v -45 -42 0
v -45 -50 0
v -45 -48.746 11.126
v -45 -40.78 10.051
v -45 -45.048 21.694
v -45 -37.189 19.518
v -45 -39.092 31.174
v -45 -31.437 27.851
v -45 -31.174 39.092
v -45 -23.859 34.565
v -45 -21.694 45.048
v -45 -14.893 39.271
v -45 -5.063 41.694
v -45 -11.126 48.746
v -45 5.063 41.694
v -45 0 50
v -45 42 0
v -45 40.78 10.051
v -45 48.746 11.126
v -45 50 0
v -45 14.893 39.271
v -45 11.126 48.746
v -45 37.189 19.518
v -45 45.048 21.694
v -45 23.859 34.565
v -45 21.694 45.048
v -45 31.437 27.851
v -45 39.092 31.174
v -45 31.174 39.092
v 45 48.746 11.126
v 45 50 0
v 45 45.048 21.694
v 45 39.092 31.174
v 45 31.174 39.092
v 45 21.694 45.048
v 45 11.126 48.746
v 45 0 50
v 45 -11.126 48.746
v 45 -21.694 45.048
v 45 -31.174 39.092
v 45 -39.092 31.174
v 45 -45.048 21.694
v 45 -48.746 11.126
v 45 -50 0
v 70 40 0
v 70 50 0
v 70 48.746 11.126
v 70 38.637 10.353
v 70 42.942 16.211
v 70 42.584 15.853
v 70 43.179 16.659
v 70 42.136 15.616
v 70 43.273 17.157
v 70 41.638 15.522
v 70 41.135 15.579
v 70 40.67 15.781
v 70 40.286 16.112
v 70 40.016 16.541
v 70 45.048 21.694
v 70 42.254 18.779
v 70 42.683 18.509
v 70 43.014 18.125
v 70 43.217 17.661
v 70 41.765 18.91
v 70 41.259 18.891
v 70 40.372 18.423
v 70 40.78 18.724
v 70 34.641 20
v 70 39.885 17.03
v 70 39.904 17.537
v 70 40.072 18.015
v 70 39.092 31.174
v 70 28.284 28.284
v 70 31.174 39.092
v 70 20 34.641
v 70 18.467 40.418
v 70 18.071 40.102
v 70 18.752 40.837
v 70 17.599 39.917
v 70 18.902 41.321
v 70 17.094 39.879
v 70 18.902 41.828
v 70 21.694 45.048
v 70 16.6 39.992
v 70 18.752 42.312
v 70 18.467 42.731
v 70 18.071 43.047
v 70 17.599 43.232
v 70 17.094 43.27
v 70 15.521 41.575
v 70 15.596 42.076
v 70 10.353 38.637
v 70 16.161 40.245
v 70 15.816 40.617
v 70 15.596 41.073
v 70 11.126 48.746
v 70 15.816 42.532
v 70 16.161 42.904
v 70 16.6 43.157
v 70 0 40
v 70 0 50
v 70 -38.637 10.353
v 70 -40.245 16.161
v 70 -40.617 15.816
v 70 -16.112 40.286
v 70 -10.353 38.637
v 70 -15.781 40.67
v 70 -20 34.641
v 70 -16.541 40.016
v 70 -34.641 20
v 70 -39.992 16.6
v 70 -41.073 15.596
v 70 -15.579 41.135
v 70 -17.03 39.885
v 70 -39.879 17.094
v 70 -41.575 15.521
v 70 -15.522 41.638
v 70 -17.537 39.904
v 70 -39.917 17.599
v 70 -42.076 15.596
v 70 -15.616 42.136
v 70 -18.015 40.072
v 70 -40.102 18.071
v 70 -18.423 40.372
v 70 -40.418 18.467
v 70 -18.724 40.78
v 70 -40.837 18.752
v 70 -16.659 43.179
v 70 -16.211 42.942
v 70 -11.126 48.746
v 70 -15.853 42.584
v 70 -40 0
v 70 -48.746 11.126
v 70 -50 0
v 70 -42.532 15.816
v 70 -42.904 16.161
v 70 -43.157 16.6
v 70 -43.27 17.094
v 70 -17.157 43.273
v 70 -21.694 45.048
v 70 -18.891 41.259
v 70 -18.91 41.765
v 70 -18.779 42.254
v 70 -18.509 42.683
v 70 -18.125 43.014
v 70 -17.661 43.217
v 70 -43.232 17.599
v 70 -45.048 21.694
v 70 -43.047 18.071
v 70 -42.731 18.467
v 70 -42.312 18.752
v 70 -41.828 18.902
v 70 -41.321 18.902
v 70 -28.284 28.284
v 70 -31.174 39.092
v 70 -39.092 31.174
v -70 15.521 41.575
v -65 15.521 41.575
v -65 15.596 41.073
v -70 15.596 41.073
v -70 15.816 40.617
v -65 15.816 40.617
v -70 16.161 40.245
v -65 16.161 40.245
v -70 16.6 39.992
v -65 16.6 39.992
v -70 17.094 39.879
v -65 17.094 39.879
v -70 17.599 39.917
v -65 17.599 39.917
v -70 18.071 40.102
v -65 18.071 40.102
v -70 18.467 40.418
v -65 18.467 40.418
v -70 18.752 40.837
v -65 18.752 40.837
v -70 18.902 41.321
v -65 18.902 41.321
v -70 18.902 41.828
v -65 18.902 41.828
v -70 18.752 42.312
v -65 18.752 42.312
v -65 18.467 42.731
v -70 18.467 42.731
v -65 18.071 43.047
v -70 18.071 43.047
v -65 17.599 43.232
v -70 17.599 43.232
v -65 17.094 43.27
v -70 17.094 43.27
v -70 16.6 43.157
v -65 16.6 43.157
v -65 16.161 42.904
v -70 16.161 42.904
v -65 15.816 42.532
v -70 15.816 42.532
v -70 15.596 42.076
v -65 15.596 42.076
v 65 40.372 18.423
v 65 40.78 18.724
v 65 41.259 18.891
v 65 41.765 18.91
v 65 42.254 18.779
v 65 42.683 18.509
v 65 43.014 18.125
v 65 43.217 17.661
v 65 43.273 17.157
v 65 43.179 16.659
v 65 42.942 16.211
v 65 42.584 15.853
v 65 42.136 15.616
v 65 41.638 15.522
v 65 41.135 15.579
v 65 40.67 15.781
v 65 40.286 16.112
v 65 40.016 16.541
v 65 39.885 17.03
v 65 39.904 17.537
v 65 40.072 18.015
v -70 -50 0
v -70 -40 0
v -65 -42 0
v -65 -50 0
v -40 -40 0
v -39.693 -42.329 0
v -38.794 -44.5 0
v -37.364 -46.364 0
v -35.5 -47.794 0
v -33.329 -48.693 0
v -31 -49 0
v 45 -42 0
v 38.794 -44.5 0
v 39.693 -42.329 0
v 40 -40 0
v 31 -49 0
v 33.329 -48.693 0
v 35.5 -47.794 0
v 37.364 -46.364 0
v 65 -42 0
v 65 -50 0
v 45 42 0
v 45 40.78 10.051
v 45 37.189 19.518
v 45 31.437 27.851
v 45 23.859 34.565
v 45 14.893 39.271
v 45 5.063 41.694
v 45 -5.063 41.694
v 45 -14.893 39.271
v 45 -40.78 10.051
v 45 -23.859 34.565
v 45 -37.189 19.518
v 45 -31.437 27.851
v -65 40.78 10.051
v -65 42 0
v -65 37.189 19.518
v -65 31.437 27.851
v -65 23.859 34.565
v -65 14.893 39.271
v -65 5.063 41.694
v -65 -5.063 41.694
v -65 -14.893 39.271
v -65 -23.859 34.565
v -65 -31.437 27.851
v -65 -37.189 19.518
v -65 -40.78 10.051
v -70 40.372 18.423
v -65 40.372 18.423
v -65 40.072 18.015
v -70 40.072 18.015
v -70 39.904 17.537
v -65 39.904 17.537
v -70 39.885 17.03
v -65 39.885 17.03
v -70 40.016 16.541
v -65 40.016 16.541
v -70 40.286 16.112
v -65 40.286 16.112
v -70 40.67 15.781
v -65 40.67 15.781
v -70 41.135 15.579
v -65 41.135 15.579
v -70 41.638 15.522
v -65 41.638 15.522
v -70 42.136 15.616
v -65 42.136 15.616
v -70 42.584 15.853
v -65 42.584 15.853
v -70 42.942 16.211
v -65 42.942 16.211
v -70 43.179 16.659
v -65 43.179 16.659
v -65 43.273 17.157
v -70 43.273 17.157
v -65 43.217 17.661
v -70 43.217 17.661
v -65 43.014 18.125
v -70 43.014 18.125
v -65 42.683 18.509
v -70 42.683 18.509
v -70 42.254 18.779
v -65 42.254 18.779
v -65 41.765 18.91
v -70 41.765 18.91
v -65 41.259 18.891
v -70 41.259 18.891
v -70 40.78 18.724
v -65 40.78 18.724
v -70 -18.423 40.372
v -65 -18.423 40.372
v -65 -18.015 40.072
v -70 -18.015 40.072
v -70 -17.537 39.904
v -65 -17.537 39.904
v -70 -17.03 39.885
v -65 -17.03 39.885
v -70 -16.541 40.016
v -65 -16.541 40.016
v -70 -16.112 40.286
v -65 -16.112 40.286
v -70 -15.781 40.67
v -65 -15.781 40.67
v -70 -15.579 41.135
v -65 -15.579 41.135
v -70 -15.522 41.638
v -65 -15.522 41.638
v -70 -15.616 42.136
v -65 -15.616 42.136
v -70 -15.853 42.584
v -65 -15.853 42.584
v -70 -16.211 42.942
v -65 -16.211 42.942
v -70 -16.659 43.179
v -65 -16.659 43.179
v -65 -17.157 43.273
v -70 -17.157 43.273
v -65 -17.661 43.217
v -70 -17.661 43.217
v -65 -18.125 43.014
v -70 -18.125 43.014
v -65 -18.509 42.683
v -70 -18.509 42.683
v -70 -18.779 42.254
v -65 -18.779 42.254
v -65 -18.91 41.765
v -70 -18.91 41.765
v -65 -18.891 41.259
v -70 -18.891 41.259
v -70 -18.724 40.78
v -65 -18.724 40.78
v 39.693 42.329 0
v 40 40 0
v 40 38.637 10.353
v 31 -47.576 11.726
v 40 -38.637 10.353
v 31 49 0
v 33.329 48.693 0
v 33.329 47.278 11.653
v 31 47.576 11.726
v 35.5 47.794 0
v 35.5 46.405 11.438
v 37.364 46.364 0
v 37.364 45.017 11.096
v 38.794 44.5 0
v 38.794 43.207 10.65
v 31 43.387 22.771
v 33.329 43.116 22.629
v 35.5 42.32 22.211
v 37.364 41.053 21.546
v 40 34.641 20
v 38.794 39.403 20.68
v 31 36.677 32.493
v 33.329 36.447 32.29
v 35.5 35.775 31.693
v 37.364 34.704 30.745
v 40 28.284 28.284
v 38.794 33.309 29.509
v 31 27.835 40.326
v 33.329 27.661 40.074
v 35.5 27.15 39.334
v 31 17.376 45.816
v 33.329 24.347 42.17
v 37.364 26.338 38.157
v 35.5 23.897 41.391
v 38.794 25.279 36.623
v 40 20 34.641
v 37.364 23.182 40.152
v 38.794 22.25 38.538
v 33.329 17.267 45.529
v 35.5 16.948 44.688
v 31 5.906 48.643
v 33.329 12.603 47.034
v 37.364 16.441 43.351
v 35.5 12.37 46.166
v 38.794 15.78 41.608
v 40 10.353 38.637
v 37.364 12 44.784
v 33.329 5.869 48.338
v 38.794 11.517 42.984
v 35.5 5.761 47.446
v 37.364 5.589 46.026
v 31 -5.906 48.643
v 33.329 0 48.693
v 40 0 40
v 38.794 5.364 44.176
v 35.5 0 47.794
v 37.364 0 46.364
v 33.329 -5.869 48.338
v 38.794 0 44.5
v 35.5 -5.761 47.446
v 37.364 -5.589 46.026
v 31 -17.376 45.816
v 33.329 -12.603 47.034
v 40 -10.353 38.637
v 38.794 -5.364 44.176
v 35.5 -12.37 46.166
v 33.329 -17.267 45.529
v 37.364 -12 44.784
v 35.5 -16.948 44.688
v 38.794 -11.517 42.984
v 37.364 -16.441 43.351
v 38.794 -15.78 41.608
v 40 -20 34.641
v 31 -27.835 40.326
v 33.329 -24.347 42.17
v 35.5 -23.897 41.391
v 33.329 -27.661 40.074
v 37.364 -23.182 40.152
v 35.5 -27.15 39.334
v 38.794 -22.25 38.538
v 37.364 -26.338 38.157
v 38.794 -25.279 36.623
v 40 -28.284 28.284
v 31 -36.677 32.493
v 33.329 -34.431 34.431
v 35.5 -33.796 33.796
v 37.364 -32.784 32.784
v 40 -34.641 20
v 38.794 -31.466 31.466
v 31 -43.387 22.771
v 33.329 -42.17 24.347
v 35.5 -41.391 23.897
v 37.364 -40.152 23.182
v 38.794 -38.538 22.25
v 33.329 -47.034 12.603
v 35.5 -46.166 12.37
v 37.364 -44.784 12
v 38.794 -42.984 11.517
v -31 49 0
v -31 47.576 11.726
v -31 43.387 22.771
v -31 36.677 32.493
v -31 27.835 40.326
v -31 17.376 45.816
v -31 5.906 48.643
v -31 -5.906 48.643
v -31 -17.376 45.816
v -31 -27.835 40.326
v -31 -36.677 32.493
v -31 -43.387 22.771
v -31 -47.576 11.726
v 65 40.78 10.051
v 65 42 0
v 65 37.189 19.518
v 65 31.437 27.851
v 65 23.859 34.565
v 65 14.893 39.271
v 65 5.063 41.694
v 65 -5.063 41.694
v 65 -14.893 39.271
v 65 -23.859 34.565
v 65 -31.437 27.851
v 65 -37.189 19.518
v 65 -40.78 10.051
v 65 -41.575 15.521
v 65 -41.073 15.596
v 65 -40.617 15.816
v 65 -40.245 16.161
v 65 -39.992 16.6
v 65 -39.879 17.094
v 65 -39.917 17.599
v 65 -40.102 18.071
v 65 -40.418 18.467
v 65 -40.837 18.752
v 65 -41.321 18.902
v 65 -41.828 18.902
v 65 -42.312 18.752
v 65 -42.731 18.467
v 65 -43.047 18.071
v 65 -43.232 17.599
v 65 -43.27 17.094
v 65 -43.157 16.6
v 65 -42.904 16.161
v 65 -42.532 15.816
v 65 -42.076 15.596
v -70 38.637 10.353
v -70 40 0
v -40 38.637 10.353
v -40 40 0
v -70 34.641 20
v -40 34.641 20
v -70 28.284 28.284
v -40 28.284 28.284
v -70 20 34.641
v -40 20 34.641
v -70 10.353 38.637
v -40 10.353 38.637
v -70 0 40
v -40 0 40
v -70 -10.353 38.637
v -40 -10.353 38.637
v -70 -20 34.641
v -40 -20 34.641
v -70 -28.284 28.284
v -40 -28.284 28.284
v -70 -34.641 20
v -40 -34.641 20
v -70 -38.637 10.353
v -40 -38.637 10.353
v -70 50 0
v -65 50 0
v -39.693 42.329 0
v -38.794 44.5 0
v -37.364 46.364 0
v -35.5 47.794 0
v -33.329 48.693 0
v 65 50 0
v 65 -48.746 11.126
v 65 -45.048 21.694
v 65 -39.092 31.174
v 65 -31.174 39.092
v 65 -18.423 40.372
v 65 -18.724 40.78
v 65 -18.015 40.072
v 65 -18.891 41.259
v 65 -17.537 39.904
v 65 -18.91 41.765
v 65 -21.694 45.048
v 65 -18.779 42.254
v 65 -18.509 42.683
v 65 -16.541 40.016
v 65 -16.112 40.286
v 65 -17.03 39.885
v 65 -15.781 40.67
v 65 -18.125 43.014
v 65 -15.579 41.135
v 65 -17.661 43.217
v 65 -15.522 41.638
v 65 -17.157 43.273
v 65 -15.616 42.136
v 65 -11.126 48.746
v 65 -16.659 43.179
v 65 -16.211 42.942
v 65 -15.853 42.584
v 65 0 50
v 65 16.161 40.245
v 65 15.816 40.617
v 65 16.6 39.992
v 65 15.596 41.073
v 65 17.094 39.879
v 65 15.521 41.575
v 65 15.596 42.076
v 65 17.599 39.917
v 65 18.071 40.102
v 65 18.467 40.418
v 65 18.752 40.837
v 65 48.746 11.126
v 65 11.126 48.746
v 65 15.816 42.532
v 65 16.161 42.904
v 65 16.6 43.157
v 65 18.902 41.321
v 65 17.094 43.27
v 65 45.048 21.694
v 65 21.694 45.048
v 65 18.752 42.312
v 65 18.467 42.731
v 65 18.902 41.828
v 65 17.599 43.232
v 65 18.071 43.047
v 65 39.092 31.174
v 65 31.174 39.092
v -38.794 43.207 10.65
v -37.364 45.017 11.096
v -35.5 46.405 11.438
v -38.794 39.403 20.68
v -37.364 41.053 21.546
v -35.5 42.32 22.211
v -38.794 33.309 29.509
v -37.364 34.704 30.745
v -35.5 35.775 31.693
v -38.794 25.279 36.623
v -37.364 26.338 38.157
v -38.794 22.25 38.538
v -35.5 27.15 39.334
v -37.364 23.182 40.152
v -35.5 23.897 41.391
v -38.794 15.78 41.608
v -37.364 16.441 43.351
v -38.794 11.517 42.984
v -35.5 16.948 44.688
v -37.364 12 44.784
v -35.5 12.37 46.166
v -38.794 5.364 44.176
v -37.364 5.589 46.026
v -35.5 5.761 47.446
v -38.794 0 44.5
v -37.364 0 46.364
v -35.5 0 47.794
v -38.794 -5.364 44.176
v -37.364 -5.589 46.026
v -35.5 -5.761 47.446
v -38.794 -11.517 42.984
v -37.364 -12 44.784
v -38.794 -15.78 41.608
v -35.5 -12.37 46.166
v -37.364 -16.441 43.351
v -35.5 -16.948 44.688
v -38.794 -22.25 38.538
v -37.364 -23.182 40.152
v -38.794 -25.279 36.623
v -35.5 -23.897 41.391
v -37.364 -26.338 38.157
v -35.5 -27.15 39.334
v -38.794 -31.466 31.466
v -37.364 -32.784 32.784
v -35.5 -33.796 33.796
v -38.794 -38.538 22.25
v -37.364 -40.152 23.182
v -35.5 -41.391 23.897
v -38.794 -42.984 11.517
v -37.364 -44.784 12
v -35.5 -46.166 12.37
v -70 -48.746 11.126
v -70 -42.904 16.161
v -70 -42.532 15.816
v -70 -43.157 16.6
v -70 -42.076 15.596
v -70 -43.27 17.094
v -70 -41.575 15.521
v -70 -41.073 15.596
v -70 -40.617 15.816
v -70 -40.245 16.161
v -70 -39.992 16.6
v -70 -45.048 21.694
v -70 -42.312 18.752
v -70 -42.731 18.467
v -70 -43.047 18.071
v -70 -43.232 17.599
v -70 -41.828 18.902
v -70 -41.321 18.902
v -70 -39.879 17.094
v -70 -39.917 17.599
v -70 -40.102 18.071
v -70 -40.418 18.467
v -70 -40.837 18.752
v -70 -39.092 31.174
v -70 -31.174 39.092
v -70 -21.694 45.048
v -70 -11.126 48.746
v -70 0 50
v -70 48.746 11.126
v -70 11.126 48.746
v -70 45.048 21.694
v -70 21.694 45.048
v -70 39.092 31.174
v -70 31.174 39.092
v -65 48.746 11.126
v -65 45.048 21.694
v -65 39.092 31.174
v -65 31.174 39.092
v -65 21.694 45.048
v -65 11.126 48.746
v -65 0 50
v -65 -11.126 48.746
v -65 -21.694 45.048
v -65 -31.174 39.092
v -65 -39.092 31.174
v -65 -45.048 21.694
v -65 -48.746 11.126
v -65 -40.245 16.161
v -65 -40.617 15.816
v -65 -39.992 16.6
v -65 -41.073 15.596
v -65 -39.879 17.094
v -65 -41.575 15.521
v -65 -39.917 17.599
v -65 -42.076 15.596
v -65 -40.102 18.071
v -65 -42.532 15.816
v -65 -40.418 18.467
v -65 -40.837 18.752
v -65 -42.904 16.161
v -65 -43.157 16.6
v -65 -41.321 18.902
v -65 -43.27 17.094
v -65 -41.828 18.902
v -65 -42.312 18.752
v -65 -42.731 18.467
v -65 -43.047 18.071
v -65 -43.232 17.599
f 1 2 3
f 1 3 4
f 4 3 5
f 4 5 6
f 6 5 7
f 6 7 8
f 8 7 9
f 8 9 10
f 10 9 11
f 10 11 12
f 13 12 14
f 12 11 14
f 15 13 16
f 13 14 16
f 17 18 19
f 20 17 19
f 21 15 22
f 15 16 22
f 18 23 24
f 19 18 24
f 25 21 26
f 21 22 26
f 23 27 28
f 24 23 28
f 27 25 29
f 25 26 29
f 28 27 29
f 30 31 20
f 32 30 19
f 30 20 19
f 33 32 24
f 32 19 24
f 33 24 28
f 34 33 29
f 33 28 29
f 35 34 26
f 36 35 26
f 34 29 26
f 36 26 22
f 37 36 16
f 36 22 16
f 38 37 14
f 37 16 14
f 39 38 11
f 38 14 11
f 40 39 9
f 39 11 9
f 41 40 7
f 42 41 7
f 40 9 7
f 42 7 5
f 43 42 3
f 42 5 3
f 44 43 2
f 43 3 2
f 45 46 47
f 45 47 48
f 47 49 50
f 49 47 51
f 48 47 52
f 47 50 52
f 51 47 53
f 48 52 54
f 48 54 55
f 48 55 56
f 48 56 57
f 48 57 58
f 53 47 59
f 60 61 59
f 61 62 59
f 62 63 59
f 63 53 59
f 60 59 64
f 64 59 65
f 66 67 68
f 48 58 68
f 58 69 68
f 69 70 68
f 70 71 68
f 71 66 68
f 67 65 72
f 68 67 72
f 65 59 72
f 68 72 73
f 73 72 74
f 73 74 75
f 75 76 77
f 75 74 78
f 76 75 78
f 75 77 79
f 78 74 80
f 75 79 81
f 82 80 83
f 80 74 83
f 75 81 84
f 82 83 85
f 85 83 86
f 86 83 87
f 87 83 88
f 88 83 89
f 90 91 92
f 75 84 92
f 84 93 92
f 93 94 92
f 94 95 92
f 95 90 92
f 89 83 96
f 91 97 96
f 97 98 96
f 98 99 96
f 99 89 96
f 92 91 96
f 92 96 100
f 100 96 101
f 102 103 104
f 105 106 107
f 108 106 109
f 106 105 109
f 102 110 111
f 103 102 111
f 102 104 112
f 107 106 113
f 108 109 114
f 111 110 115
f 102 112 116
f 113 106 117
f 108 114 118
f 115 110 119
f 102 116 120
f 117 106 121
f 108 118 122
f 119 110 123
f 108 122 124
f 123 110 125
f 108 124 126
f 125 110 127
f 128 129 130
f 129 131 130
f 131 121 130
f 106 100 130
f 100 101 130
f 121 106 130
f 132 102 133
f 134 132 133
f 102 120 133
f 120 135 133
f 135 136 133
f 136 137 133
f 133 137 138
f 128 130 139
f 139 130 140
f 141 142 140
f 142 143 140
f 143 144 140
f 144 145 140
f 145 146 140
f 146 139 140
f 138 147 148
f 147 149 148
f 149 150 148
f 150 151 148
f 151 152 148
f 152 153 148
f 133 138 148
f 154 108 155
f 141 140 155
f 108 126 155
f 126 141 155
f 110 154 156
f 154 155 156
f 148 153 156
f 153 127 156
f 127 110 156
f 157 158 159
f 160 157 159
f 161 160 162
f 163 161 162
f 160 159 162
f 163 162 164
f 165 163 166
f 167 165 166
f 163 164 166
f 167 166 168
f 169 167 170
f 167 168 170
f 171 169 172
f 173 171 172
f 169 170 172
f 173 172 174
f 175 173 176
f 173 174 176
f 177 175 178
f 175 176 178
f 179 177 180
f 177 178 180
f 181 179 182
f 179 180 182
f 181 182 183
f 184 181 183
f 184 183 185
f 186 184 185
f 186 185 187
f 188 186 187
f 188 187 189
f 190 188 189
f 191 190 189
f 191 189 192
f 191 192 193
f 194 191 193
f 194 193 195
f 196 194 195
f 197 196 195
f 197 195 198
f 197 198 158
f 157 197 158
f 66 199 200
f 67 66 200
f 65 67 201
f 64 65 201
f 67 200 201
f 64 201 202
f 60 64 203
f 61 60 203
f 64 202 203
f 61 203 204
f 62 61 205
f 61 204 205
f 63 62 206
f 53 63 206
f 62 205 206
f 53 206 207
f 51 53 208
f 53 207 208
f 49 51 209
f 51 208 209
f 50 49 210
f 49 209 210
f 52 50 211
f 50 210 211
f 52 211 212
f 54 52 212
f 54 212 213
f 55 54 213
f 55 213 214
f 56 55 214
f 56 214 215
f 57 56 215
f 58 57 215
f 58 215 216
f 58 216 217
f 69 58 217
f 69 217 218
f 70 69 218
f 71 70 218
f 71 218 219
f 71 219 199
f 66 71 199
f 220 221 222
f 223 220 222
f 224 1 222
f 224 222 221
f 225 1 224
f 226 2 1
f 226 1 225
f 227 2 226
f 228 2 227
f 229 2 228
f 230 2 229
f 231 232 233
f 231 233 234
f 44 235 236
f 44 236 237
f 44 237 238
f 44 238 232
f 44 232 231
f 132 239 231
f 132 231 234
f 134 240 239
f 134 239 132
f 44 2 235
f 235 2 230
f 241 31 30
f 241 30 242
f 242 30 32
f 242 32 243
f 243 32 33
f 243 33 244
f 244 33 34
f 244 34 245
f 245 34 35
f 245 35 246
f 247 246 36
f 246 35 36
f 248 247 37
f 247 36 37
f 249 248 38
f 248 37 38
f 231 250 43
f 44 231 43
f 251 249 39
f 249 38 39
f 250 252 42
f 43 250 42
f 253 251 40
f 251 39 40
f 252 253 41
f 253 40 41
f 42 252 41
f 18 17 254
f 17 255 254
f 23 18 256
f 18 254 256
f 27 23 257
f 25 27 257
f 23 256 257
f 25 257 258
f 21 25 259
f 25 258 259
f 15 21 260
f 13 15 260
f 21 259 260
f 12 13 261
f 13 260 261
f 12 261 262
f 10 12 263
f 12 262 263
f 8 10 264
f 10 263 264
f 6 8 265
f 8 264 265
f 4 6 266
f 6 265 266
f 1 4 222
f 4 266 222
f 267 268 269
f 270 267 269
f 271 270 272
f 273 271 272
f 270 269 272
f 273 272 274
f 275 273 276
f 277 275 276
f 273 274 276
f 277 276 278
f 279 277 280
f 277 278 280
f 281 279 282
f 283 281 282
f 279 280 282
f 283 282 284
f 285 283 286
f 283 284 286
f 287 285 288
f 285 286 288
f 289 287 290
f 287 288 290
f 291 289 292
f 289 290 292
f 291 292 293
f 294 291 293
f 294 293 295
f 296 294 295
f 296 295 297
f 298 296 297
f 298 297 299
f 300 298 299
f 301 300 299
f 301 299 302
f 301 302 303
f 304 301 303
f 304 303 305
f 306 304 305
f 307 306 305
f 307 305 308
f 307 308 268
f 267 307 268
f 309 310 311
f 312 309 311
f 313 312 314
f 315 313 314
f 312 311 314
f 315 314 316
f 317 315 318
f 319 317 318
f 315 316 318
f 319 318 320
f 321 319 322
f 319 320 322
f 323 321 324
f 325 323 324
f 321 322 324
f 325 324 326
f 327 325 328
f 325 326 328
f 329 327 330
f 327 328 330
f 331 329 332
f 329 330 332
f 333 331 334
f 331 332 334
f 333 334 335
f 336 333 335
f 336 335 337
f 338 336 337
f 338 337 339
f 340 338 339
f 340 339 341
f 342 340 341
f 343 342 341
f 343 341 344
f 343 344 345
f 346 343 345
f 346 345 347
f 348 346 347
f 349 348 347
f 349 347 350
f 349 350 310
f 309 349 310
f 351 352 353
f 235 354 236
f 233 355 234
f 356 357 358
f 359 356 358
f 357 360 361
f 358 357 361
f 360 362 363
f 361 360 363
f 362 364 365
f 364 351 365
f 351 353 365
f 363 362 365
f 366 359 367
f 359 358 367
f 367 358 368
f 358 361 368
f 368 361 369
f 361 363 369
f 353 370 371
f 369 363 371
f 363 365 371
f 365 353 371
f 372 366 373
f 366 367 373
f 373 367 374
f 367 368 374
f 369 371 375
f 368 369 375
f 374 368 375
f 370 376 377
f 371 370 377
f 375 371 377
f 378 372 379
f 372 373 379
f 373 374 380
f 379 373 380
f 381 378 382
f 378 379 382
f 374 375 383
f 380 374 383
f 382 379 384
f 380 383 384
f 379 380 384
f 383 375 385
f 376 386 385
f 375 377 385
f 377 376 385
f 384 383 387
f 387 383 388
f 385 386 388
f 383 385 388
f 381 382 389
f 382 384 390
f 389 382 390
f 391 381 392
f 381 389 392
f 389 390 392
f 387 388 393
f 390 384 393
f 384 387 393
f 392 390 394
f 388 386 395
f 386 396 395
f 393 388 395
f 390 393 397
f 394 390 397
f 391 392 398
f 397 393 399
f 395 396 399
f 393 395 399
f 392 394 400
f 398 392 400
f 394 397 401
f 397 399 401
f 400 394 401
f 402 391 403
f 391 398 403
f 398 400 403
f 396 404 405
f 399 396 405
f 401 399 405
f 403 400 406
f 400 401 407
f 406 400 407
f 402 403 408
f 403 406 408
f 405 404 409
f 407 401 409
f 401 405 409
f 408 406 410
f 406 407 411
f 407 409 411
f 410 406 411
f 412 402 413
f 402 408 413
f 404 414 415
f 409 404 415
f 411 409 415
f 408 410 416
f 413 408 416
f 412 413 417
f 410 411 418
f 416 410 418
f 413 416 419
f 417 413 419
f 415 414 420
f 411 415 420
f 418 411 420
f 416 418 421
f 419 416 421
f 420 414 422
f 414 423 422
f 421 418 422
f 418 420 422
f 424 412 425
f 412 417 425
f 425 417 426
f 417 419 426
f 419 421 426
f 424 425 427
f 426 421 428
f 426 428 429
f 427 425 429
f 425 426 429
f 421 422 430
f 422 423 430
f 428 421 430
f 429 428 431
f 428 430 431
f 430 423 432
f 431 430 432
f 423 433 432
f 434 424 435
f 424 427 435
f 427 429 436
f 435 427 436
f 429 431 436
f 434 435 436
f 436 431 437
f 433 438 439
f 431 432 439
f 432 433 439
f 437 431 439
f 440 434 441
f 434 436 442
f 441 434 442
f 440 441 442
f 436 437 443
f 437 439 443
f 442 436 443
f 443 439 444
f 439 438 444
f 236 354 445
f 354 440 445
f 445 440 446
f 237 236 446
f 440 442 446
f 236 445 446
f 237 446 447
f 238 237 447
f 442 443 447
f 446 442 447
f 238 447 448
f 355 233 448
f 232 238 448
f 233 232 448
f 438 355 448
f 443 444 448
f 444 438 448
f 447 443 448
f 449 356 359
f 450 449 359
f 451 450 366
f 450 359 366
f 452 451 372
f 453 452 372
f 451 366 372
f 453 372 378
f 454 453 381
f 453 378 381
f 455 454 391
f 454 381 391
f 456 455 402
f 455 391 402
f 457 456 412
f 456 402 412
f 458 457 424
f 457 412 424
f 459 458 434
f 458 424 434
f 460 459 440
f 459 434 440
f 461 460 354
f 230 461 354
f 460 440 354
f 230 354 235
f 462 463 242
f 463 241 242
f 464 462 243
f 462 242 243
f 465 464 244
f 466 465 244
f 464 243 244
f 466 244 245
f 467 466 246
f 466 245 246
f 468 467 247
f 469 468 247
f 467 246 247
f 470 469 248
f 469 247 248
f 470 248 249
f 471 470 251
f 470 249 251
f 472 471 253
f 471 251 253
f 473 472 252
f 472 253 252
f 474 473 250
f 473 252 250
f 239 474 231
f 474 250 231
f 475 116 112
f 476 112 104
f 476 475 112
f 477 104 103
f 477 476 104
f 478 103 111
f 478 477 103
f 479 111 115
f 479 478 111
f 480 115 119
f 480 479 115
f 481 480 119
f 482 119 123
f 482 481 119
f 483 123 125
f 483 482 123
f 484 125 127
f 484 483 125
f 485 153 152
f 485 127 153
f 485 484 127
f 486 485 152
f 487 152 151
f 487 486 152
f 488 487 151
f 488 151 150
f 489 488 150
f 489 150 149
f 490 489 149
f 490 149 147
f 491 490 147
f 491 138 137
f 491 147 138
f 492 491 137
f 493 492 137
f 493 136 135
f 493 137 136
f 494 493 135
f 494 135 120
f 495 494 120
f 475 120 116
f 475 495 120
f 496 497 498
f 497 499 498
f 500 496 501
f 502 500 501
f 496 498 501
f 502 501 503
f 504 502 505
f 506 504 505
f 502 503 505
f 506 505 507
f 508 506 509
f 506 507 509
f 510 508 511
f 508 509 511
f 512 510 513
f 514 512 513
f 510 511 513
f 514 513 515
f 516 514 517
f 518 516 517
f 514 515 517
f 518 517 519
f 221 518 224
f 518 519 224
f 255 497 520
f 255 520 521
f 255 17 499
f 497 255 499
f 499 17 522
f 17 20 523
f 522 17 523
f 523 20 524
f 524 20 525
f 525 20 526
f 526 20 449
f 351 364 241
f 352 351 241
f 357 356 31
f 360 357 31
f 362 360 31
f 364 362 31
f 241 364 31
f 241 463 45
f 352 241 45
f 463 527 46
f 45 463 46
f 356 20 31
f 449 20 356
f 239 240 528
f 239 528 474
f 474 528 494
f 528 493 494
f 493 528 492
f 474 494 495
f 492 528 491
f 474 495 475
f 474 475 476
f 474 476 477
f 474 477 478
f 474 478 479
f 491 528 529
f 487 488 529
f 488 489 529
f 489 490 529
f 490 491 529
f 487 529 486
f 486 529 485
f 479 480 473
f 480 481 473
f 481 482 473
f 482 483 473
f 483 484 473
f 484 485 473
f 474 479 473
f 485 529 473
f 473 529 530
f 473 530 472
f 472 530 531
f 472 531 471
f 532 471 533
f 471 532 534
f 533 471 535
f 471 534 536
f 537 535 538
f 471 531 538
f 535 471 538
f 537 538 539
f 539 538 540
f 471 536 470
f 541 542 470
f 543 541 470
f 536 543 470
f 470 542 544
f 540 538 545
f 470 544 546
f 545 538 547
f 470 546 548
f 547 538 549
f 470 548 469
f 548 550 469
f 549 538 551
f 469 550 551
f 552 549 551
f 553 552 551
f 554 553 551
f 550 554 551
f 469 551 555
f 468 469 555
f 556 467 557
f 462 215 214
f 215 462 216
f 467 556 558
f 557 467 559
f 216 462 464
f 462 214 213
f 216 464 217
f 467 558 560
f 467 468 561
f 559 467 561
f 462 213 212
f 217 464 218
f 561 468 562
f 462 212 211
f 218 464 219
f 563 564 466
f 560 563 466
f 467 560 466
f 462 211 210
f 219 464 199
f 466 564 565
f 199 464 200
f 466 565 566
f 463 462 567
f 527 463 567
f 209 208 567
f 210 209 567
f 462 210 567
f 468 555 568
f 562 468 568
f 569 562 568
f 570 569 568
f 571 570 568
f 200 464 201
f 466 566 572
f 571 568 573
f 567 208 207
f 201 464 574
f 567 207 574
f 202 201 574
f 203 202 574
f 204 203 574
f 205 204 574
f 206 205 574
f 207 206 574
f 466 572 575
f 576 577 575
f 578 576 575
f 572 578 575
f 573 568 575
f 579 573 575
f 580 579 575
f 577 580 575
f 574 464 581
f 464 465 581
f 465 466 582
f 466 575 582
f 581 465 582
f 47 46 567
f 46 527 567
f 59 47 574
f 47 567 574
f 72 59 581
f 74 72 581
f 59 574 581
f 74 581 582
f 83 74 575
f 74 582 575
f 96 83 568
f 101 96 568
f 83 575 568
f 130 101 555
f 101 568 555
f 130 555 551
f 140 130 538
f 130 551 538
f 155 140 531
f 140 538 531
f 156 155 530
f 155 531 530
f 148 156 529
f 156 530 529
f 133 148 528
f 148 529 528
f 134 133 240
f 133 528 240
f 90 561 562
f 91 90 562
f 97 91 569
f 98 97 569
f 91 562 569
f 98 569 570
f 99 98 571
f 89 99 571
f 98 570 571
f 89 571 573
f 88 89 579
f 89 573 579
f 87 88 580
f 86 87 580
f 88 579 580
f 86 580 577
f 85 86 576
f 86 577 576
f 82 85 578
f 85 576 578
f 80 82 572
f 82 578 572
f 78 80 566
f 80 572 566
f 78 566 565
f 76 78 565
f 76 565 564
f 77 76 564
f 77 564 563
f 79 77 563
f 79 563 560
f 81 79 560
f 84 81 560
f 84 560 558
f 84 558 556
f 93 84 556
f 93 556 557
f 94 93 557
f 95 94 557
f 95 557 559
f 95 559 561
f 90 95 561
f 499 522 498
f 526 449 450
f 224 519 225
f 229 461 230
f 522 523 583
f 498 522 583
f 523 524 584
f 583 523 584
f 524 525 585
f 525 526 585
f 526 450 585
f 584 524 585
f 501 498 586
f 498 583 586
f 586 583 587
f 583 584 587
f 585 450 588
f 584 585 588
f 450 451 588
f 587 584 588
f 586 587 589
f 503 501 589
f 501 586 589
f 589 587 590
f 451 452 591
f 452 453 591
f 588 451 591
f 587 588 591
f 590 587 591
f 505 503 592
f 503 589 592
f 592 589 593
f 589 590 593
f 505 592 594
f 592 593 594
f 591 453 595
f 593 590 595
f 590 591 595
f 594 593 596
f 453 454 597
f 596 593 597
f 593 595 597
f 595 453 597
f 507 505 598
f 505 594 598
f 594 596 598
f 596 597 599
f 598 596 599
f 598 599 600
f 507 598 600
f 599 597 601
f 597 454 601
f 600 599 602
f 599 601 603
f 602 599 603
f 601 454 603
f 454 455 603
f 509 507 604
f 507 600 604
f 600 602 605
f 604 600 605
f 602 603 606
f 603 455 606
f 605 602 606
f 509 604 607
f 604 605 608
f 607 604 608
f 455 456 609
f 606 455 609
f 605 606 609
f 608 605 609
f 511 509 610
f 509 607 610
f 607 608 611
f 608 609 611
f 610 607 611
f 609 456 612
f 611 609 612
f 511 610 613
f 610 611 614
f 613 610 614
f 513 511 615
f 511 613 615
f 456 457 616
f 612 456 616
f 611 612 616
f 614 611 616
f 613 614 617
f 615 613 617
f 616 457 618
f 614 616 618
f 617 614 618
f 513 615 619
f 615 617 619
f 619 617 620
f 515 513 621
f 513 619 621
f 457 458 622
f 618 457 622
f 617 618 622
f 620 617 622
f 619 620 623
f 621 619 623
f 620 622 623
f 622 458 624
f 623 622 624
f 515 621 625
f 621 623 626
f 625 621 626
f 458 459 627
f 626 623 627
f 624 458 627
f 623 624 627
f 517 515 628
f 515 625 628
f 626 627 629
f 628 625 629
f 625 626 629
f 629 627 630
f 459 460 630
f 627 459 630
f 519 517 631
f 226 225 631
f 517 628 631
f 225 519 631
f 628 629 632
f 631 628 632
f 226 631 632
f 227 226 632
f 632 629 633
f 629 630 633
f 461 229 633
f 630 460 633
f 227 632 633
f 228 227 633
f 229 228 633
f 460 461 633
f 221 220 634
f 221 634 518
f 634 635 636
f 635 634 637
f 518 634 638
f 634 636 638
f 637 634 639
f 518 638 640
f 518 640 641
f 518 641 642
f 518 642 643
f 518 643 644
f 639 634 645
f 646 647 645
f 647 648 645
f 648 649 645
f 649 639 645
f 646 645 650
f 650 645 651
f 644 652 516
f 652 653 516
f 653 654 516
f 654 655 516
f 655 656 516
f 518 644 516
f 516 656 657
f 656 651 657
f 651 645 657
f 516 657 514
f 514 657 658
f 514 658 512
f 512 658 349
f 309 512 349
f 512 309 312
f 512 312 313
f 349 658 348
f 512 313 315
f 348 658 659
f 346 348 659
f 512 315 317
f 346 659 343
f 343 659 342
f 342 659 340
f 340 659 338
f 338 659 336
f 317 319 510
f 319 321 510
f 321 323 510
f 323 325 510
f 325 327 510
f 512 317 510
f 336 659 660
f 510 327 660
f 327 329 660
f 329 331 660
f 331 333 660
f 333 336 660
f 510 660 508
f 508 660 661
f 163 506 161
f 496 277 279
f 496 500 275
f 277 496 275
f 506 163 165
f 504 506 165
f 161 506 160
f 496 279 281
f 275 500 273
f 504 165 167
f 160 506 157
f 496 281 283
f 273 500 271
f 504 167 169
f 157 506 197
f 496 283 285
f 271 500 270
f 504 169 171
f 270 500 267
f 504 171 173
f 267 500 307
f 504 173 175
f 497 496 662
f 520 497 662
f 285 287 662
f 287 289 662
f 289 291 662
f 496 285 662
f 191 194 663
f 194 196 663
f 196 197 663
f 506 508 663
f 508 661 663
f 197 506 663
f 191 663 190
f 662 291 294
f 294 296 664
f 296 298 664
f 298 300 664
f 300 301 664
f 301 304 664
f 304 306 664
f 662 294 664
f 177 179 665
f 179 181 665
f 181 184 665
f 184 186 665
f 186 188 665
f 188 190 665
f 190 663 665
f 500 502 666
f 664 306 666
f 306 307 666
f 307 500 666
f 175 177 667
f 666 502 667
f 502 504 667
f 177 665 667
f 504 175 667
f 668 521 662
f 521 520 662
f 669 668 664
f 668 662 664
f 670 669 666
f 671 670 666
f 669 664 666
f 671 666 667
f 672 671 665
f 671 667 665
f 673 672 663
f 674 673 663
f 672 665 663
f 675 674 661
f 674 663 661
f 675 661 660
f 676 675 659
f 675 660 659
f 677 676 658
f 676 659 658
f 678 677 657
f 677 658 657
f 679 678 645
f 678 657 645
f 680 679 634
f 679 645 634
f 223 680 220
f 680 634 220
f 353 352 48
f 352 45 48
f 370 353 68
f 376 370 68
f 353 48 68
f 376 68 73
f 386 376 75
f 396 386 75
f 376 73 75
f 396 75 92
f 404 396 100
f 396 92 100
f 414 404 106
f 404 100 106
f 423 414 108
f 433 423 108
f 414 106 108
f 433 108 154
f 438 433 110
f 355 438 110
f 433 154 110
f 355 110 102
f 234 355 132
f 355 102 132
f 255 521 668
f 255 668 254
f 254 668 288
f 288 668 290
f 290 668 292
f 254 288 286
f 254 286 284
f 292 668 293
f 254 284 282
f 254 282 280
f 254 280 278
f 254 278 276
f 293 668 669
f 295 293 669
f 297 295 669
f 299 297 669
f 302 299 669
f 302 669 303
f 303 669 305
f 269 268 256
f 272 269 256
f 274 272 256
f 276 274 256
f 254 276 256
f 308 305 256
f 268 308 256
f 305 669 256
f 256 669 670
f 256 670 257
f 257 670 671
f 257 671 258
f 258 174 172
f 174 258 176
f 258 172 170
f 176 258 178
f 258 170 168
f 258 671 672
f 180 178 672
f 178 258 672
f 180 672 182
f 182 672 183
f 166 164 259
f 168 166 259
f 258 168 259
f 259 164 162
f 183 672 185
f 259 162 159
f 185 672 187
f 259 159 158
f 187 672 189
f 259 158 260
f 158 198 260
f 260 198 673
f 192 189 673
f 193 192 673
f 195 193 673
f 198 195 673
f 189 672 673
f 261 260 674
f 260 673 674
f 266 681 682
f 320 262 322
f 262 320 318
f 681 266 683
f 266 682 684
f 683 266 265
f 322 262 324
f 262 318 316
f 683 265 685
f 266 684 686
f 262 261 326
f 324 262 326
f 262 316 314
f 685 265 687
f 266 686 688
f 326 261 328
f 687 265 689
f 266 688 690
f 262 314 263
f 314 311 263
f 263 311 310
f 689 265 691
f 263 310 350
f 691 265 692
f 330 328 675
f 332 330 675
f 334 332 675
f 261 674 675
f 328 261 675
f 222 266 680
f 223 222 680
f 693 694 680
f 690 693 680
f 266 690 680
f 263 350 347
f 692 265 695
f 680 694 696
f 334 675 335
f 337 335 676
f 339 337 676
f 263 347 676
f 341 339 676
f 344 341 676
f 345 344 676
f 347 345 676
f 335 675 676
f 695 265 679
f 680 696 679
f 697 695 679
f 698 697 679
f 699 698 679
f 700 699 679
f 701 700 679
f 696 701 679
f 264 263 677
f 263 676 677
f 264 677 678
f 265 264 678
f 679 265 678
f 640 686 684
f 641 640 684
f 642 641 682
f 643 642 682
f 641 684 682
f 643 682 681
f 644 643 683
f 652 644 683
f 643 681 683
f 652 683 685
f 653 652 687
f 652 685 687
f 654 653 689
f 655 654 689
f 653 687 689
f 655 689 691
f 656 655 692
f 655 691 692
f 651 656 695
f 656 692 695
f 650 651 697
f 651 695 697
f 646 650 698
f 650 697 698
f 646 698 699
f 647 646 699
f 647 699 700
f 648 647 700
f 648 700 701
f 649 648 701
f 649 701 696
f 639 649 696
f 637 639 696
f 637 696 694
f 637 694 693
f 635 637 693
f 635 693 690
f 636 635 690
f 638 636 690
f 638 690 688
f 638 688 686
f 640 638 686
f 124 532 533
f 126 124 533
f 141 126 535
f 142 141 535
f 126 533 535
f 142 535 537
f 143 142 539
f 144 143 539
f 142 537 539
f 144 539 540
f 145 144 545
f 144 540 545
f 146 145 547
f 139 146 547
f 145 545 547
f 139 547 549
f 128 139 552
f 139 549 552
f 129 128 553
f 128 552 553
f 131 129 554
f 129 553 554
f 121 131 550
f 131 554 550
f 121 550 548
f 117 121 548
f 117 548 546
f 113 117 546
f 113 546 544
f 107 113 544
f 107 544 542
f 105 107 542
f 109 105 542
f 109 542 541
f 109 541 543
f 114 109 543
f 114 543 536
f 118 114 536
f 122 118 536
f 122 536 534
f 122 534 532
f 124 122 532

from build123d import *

# Parameters (mm, degrees)
REVOLVE_1_ANGLE          = 180
HOLE_WIZARD_M3_1_D       = 3.4
HOLE_WIZARD_M3_1_DEPTH   = 5
PATTERN_CIRCULAR_1_COUNT = 4
PATTERN_CIRCULAR_1_ANGLE = 135
MIRROR_1_COPY_1_D        = 3.4
MIRROR_1_COPY_1_DEPTH    = 5
MIRROR_1_COPY_2_D        = 3.4
MIRROR_1_COPY_2_DEPTH    = 5
MIRROR_1_COPY_3_D        = 3.4
MIRROR_1_COPY_3_DEPTH    = 5
FILLET_1_R               = 9


with BuildPart() as part:
    # ｽｹｯﾁ1 → 回転1 (revolve)
    with BuildSketch(Plane.XY):
        Polygon((-70, 40), (-40, 40), (-40, 49), (40, 49), (40, 40), (70, 40), (70, 50), (65, 50), (65, 42), (45, 42), (45, 50), (-45, 50), (-45, 42), (-65, 42), (-65, 50), (-70, 50), align=None)
    revolve(axis=Axis((-50, 0, 0), (1, 0, 0)), revolution_arc=REVOLVE_1_ANGLE)

    # M3 すきま穴1
    with Locations(Plane.ZY.offset(70)):
        with Locations((17.220754456, -41.574578963)):
            hole_wizard_m3_1 = Hole(HOLE_WIZARD_M3_1_D / 2, depth=HOLE_WIZARD_M3_1_DEPTH)

    # 円形ﾊﾟﾀｰﾝ1: M3 すきま穴1 ×4 about axis
    pattern_circular_1_axis = Axis((0, 0, 0), (-1, 0, 0))
    for i in range(1, PATTERN_CIRCULAR_1_COUNT):
        add(hole_wizard_m3_1.rotate(pattern_circular_1_axis, i * PATTERN_CIRCULAR_1_ANGLE / (PATTERN_CIRCULAR_1_COUNT - 1)), mode=Mode.SUBTRACT)

    # ﾐﾗｰ1: M3 すきま穴1 across plane
    add(hole_wizard_m3_1.mirror(Plane(origin=(0, 0, 0), x_dir=(0, 0, 1), z_dir=(1, 0, 0))), mode=Mode.SUBTRACT)

    # ﾐﾗｰ1 copy 1
    with Locations(Plane(origin=(70, 0, 0), x_dir=(0, 0.7071067811865487, 0.7071067811865464), z_dir=(1, 0, 0))):
        with Locations((17.220754456, 41.574578963)):
            Hole(MIRROR_1_COPY_1_D / 2, depth=MIRROR_1_COPY_1_DEPTH)

    # ﾐﾗｰ1 copy 2
    with Locations(Plane.YZ.offset(70)):
        with Locations((17.220754456, 41.574578963)):
            Hole(MIRROR_1_COPY_2_D / 2, depth=MIRROR_1_COPY_2_DEPTH)

    # ﾐﾗｰ1 copy 3
    with Locations(Plane(origin=(70, 0, 0), x_dir=(0, 0.7071067811865441, -0.7071067811865509), z_dir=(1, 0, 0))):
        with Locations((17.220754456, 41.574578963)):
            Hole(MIRROR_1_COPY_3_D / 2, depth=MIRROR_1_COPY_3_DEPTH)

    # ﾌｨﾚｯﾄ1
    fillet_1_edges = [part.edges().sort_by_distance(p)[0] for p in [
        (-40, 0, 49),
        (40, 0, 49),
    ]]
    fillet(fillet_1_edges, radius=FILLET_1_R - 0.0001)  # a hair under: the kernel refuses the full size


solid = part.part
